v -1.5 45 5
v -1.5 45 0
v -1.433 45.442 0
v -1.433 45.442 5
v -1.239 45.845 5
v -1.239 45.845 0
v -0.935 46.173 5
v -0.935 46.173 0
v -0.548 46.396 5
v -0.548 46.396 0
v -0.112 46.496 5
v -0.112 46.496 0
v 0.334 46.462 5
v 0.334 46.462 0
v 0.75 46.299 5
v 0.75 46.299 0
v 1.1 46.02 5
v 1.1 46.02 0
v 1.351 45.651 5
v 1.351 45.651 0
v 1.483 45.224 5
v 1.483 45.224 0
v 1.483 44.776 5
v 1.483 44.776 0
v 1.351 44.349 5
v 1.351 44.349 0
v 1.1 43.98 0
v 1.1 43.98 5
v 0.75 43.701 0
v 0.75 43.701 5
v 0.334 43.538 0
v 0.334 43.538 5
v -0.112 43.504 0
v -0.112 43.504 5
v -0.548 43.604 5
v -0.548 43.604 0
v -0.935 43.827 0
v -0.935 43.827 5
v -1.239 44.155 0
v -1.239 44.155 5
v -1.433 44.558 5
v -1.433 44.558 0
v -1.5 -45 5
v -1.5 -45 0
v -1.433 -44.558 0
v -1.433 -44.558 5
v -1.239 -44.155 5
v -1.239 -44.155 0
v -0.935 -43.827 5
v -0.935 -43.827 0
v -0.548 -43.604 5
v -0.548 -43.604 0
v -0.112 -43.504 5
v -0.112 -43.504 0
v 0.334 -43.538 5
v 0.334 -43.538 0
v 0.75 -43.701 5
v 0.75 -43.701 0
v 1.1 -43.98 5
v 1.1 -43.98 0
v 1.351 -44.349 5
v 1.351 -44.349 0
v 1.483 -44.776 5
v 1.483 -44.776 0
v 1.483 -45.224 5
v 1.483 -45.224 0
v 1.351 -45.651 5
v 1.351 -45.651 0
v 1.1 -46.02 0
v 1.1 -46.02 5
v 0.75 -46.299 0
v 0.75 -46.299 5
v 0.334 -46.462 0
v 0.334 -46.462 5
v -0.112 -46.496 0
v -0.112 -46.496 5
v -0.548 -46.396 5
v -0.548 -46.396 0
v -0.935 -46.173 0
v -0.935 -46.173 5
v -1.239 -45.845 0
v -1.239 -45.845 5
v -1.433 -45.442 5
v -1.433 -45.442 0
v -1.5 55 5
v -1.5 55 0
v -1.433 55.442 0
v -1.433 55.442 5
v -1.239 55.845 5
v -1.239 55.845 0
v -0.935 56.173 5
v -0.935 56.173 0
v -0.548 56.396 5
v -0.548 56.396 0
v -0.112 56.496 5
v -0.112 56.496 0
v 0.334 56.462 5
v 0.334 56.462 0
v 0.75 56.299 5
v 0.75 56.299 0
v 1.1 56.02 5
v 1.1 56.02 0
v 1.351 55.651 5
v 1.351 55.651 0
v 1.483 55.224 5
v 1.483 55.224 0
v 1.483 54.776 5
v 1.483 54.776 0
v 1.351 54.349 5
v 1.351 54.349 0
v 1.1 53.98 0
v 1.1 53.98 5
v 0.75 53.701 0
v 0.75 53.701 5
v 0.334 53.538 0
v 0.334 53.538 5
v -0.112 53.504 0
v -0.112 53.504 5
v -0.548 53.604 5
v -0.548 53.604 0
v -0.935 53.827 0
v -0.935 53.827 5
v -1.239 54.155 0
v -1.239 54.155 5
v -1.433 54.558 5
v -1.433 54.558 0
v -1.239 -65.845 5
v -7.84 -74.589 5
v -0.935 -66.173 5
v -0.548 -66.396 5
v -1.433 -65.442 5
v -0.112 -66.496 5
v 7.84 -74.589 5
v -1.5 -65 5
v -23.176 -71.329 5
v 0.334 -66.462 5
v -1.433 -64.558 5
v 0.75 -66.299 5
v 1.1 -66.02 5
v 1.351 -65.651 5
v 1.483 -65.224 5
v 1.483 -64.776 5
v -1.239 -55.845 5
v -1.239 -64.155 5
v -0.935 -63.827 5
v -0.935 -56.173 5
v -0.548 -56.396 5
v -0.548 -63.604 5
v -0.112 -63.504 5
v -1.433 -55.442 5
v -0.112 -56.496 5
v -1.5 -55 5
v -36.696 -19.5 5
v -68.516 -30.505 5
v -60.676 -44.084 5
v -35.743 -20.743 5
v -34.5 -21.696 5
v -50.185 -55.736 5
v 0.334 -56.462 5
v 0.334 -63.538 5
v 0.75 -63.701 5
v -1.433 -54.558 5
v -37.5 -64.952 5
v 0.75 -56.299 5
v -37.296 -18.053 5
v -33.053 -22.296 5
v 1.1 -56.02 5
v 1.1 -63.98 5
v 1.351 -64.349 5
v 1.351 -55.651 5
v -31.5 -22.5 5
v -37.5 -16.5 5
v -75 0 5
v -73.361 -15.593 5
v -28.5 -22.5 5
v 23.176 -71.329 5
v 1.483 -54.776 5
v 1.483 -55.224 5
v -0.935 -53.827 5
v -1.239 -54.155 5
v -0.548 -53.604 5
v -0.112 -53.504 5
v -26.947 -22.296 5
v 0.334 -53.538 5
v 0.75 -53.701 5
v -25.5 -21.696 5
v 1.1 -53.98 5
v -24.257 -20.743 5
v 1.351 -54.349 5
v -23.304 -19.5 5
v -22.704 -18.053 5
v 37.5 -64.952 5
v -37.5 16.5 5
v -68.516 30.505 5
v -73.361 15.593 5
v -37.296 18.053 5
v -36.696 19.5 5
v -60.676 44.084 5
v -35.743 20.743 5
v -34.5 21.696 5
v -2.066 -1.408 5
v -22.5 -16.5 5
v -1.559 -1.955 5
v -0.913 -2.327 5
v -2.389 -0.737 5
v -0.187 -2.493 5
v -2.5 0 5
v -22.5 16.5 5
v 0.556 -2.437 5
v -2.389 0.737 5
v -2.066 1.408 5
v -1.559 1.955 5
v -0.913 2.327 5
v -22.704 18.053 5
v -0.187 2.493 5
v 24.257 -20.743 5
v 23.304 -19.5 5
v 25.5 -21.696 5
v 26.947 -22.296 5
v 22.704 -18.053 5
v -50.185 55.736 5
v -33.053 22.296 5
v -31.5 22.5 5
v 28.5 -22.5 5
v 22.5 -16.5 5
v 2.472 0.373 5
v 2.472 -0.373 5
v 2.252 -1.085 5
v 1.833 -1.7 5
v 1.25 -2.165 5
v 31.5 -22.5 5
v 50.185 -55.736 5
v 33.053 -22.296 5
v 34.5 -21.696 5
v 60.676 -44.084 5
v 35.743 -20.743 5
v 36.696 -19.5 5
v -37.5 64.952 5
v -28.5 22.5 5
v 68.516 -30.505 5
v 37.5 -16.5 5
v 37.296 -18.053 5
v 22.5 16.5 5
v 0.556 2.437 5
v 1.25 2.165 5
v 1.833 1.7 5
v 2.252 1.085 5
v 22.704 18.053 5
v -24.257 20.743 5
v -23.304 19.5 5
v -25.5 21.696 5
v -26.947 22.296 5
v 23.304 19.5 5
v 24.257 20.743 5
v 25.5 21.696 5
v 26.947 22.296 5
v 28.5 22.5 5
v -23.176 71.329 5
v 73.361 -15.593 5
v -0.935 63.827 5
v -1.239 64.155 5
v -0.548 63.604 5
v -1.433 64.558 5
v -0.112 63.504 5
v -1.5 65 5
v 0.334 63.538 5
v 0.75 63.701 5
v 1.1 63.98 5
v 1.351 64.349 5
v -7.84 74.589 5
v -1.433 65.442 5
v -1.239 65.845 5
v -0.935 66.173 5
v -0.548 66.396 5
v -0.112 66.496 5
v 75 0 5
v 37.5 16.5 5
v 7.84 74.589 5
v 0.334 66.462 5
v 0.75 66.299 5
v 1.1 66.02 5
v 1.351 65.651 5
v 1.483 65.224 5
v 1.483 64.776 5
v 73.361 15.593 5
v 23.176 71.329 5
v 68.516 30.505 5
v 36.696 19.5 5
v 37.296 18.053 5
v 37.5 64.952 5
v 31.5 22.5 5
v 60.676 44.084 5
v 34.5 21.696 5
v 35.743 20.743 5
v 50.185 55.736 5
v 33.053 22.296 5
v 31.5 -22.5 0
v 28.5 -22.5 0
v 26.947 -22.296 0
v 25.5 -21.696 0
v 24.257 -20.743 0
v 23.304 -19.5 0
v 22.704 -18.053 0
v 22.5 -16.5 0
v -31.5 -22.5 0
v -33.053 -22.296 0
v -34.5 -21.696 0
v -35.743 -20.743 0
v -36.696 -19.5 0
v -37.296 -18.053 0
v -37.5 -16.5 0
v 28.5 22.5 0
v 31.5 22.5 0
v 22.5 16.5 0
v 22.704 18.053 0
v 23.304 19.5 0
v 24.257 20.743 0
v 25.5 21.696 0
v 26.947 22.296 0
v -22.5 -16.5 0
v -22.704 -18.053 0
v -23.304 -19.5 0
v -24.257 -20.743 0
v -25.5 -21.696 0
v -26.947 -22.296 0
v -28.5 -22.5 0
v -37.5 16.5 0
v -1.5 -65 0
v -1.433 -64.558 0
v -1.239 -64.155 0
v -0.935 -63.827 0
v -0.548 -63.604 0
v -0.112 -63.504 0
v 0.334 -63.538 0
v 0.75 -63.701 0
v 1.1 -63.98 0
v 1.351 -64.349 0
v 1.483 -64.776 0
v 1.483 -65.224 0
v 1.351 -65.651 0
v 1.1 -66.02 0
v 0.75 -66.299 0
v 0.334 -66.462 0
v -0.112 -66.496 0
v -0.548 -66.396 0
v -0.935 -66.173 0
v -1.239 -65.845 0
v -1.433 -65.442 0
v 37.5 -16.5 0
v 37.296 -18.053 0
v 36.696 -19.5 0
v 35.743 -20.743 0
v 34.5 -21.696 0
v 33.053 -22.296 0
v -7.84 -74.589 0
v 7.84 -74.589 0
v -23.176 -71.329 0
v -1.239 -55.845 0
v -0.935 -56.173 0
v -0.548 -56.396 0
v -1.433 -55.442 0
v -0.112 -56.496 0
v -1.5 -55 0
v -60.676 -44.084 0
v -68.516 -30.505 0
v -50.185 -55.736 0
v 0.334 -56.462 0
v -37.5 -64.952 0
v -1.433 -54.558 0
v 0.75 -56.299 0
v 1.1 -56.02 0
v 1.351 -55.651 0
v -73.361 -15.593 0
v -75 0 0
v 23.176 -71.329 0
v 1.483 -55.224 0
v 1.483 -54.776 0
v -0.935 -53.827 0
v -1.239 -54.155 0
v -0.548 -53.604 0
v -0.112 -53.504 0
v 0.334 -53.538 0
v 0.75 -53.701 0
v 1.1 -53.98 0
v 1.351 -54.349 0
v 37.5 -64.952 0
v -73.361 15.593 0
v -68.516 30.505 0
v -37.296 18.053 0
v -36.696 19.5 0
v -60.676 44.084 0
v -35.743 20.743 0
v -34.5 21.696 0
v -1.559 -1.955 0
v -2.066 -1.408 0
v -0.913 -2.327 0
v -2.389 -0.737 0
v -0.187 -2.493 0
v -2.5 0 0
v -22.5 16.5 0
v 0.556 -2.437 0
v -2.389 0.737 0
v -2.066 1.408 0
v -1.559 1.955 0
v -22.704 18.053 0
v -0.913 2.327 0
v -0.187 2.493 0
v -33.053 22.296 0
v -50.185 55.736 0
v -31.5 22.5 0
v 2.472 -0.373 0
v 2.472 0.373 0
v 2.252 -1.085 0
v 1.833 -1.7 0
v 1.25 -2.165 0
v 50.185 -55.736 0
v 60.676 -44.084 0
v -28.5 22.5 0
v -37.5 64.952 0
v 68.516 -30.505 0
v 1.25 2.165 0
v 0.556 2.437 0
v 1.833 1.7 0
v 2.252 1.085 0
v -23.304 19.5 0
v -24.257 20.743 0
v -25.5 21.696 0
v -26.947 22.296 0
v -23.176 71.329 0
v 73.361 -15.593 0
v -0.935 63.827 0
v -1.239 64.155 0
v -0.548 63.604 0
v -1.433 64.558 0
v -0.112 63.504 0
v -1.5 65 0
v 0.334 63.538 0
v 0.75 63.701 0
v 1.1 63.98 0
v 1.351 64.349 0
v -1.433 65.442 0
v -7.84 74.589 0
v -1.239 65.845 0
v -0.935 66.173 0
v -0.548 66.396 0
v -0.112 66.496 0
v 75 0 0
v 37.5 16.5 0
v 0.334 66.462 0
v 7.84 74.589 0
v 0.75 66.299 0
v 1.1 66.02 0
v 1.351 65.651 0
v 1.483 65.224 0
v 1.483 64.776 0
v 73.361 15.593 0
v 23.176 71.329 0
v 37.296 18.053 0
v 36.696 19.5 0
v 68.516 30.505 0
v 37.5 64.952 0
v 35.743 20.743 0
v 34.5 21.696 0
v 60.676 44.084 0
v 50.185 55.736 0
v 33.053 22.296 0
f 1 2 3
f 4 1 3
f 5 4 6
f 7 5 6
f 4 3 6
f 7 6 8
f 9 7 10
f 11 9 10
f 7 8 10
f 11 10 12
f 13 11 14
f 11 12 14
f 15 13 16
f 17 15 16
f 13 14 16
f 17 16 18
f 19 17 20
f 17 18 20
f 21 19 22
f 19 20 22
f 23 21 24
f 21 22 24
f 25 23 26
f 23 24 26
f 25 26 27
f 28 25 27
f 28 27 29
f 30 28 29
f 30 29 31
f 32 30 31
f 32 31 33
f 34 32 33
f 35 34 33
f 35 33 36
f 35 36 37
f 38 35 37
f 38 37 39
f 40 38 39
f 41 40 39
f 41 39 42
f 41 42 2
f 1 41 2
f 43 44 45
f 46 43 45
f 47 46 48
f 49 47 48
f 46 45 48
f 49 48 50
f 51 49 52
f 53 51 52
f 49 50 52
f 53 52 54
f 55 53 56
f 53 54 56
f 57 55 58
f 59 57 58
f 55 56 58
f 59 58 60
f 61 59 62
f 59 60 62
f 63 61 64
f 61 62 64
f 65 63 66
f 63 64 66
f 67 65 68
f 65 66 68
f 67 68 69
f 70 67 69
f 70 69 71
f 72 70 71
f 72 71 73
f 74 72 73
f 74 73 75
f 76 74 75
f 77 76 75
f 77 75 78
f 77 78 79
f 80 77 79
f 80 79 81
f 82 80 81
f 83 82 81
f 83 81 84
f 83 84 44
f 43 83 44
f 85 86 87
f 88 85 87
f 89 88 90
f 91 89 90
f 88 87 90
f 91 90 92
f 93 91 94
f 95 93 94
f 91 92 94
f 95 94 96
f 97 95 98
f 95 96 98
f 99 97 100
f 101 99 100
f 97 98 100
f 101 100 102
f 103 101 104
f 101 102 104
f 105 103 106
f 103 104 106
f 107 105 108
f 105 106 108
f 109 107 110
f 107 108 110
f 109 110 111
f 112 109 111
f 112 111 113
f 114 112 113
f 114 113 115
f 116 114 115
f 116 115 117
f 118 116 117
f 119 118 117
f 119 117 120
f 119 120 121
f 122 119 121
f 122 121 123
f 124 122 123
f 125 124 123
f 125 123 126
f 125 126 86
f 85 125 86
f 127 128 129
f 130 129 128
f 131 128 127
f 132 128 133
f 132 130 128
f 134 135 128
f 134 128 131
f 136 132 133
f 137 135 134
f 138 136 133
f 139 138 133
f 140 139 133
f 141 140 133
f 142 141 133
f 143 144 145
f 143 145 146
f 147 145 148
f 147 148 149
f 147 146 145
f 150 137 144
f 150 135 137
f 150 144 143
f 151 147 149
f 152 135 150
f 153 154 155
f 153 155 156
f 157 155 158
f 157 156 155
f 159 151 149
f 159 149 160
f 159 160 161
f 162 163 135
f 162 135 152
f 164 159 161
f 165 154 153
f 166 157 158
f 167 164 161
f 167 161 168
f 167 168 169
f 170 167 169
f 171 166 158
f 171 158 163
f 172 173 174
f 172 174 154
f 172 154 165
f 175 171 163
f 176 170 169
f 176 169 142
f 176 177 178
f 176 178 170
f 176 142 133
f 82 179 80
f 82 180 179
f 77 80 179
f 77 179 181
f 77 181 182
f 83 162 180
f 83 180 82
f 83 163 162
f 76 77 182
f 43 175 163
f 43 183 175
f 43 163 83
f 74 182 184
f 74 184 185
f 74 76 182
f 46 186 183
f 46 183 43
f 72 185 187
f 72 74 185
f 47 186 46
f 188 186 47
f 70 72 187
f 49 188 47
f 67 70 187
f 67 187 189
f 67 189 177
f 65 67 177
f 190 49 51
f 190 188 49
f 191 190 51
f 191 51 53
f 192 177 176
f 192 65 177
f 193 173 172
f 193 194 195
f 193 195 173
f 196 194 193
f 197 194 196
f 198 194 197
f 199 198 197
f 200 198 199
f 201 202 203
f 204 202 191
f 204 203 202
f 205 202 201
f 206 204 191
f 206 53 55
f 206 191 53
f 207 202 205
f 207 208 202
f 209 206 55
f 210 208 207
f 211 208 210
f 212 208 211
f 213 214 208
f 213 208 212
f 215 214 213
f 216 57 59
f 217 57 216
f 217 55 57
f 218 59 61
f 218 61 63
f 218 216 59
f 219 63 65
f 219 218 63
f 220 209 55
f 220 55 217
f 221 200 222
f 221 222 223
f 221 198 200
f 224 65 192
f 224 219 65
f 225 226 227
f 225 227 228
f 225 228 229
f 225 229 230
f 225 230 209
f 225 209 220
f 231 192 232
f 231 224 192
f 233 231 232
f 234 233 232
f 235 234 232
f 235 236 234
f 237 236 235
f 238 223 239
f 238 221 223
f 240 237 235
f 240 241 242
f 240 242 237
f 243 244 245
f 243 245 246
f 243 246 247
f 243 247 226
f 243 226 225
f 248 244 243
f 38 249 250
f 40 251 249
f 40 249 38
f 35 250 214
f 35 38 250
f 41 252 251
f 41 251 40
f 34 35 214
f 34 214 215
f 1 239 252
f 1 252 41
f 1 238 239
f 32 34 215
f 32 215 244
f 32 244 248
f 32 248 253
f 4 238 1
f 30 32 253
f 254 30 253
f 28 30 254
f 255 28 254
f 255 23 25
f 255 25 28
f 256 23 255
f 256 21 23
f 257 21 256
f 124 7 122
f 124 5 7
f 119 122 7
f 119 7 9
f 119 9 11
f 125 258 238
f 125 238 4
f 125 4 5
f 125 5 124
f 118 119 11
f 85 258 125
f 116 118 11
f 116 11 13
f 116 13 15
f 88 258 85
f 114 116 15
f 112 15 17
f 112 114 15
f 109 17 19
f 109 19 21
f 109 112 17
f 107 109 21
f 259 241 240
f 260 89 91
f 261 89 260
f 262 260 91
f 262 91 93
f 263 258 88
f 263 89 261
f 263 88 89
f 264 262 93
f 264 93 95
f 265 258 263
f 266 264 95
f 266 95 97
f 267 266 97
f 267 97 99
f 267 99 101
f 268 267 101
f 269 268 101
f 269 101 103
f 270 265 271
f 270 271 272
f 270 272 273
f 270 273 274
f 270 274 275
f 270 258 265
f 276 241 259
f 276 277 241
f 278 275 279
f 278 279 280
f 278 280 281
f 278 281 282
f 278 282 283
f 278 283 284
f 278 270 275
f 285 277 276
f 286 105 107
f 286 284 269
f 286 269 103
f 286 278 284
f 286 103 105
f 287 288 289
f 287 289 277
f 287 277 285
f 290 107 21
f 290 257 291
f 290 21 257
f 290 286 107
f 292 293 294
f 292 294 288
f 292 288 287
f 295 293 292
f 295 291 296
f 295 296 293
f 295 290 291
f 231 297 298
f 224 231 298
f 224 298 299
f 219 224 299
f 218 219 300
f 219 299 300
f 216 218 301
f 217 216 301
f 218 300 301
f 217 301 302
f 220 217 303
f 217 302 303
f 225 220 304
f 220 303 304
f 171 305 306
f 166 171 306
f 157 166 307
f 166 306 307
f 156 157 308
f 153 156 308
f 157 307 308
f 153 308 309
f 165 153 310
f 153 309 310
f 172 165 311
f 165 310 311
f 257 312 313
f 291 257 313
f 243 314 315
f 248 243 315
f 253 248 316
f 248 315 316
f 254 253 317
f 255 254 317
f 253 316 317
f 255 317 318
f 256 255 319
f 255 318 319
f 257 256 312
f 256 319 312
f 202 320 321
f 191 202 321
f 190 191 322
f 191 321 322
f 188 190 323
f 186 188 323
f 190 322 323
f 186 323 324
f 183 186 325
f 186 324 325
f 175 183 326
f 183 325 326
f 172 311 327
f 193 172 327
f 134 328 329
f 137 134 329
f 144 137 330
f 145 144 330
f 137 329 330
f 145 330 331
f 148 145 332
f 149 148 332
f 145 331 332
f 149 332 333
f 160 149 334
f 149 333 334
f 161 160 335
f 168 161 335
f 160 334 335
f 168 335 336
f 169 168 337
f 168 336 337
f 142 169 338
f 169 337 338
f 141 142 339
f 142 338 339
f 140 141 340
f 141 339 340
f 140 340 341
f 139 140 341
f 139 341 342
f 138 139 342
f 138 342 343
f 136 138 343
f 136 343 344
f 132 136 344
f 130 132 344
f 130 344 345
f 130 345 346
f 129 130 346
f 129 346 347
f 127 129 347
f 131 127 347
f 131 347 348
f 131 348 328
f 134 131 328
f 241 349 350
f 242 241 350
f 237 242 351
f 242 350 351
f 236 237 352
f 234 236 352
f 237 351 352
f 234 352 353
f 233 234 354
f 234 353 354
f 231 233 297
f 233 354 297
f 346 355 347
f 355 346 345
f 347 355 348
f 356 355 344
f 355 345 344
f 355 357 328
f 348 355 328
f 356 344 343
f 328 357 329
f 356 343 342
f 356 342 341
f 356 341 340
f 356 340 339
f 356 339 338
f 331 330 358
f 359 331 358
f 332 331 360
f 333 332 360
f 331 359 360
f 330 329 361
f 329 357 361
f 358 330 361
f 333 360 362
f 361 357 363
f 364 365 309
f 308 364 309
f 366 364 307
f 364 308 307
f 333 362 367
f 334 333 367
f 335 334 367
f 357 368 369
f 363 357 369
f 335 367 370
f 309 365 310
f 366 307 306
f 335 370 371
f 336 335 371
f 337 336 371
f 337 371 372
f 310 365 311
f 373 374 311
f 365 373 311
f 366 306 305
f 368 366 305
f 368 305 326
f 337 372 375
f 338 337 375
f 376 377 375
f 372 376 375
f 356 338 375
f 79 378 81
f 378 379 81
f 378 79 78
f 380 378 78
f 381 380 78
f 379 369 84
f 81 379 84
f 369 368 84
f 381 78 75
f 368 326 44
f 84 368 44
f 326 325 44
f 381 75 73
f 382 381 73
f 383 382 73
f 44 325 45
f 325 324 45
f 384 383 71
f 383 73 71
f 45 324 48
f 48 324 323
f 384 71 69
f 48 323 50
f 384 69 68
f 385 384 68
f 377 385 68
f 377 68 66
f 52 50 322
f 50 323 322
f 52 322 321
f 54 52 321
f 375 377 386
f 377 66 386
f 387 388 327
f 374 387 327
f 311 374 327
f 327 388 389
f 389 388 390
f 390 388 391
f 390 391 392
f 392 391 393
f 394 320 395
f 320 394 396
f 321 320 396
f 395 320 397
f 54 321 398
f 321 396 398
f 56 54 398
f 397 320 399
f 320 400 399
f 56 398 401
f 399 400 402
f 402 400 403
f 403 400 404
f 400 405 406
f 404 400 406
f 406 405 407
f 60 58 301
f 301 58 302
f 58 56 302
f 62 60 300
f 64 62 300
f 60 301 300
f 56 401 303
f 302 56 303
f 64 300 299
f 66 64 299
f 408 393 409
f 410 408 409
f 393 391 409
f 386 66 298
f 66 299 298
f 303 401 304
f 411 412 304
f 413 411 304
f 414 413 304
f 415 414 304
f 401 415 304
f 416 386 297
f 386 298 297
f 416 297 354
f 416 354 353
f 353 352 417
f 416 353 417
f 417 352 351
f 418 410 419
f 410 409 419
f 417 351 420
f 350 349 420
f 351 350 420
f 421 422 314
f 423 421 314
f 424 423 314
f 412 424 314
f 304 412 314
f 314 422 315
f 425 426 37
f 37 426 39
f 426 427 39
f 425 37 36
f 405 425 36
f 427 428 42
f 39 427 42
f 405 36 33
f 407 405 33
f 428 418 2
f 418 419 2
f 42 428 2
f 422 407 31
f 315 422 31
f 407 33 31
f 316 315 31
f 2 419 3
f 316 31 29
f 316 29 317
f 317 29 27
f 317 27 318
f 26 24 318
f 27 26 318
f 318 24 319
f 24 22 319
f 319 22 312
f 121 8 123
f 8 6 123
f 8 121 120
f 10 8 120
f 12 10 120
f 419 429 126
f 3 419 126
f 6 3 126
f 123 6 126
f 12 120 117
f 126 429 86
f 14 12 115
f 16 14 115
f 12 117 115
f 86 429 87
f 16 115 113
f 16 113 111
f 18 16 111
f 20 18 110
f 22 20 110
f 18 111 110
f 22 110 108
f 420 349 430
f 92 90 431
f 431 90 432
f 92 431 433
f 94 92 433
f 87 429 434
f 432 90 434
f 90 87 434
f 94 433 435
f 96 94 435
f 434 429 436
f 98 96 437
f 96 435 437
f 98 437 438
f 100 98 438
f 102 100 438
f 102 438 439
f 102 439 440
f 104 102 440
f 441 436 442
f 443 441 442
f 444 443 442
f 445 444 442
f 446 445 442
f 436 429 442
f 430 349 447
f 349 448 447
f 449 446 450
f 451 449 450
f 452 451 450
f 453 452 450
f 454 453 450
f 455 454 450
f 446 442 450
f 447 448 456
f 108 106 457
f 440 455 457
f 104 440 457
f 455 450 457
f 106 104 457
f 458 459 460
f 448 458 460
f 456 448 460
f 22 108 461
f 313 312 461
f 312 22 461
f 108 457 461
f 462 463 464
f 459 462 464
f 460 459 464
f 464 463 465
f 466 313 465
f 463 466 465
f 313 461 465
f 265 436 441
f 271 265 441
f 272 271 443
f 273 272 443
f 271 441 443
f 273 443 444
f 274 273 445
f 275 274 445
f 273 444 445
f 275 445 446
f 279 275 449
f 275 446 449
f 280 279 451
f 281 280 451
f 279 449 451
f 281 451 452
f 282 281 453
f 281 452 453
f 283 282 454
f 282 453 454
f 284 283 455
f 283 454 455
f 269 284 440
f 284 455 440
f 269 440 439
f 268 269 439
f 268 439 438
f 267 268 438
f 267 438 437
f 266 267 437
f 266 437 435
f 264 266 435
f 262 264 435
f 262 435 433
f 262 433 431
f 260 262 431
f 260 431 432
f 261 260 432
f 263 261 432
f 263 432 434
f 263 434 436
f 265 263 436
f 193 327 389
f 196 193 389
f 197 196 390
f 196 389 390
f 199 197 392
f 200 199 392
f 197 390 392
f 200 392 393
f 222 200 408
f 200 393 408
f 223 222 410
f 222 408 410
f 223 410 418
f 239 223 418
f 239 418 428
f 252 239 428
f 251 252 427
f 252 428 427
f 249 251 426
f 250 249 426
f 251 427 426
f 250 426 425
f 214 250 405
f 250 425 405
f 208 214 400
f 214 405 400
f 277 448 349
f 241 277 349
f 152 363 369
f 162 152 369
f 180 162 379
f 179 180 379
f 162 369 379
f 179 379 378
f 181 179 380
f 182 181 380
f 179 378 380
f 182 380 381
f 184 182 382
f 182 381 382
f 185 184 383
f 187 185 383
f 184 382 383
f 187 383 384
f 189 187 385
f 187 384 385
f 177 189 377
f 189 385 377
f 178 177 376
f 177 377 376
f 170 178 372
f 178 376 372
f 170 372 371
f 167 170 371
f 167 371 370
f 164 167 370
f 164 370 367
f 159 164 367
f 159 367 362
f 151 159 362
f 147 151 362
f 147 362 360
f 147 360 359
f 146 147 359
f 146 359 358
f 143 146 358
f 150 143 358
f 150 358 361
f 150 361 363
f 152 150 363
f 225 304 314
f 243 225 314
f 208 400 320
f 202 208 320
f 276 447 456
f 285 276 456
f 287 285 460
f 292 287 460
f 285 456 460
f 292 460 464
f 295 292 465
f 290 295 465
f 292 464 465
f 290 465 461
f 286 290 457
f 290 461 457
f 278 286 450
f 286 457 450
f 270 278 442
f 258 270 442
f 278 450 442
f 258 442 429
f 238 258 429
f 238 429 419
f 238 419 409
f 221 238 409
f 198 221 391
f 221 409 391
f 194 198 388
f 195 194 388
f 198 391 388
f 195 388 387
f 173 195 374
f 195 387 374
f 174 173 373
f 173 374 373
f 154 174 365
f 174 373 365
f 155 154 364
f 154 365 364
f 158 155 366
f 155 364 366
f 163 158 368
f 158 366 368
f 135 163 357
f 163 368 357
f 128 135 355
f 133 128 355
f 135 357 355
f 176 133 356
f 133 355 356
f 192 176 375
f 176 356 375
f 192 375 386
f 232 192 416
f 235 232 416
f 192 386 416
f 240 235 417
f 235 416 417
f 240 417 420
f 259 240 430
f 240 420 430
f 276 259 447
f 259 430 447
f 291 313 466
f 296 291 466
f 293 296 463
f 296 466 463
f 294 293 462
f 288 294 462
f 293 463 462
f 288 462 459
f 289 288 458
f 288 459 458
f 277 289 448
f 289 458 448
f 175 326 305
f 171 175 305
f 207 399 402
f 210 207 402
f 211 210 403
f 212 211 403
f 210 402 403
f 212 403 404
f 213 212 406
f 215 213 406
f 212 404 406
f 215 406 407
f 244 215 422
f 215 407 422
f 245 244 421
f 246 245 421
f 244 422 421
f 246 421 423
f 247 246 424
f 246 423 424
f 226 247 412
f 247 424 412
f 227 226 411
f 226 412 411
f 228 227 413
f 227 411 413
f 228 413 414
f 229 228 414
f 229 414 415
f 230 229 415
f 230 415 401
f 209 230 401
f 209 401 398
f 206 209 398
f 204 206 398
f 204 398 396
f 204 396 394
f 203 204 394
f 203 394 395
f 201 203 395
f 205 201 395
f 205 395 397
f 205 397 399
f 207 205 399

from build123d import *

# Parameters (mm, degrees)
ESBO_O1_R                = 75
RESSALTO_EXTRUS_O1_DEPTH = 5
ESBO_O2_R                = 2.5
CORTE_EXTRUS_O1_DEPTH    = 10
ESBO_O3_R                = 1.5
CORTE_EXTRUS_O2_DEPTH    = 10
CORTE_EXTRUS_O3_DEPTH    = 6


with BuildPart() as part:
    # Esboço1 → Ressalto-extrusão1 (new body)
    with BuildSketch(Plane.XY):
        Circle(ESBO_O1_R)
    extrude(amount=RESSALTO_EXTRUS_O1_DEPTH)

    # Esboço2 → Corte-extrusão1 (cut)
    with BuildSketch(Plane(origin=(0, 0, 0), x_dir=(-1, 0, 0), z_dir=(0, 0, -1))):
        Circle(ESBO_O2_R)
    extrude(amount=-CORTE_EXTRUS_O1_DEPTH, mode=Mode.SUBTRACT)

    # Esboço3 → Corte-extrusão2 (cut)
    with BuildSketch(Plane(origin=(0, 0, 0), x_dir=(-1, 0, 0), z_dir=(0, 0, -1))):
        with Locations((0, -45)):
            Circle(ESBO_O3_R)
        with Locations((0, -55)):
            Circle(ESBO_O3_R)
        with Locations((0, -65)):
            Circle(ESBO_O3_R)
        with Locations((0, 65)):
            Circle(ESBO_O3_R)
        with Locations((0, 55)):
            Circle(ESBO_O3_R)
        with Locations((0, 45)):
            Circle(ESBO_O3_R)
    extrude(amount=-CORTE_EXTRUS_O2_DEPTH, mode=Mode.SUBTRACT)

    # Esboço4 → Corte-extrusão3 (cut, through all)
    with BuildSketch(Plane(origin=(0, 0, 0), x_dir=(-1, 0, 0), z_dir=(0, 0, -1))):
        with BuildLine():
            Line((-31.5, -22.5), (-28.5, -22.5))
            ThreePointArc((-28.5, -22.5), (-24.257359313, -20.742640687), (-22.5, -16.5))
            Line((-22.5, -16.5), (-22.5, 16.5))
            ThreePointArc((-22.5, 16.5), (-24.257359313, 20.742640687), (-28.5, 22.5))
            Line((-28.5, 22.5), (-31.5, 22.5))
            ThreePointArc((-31.5, 22.5), (-35.742640687, 20.742640687), (-37.5, 16.5))
            Line((-37.5, 16.5), (-37.5, -16.5))
            ThreePointArc((-37.5, -16.5), (-35.742640687, -20.742640687), (-31.5, -22.5))
        make_face()
        with BuildLine():
            Line((28.5, -22.5), (31.5, -22.5))
            ThreePointArc((31.5, -22.5), (35.742640687, -20.742640687), (37.5, -16.5))
            Line((37.5, -16.5), (37.5, 16.5))
            ThreePointArc((37.5, 16.5), (35.742640687, 20.742640687), (31.5, 22.5))
            Line((31.5, 22.5), (28.5, 22.5))
            ThreePointArc((28.5, 22.5), (24.257359313, 20.742640687), (22.5, 16.5))
            Line((22.5, 16.5), (22.5, -16.5))
            ThreePointArc((22.5, -16.5), (24.257359313, -20.742640687), (28.5, -22.5))
        make_face()
    extrude(amount=-CORTE_EXTRUS_O3_DEPTH, mode=Mode.SUBTRACT)


solid = part.part
